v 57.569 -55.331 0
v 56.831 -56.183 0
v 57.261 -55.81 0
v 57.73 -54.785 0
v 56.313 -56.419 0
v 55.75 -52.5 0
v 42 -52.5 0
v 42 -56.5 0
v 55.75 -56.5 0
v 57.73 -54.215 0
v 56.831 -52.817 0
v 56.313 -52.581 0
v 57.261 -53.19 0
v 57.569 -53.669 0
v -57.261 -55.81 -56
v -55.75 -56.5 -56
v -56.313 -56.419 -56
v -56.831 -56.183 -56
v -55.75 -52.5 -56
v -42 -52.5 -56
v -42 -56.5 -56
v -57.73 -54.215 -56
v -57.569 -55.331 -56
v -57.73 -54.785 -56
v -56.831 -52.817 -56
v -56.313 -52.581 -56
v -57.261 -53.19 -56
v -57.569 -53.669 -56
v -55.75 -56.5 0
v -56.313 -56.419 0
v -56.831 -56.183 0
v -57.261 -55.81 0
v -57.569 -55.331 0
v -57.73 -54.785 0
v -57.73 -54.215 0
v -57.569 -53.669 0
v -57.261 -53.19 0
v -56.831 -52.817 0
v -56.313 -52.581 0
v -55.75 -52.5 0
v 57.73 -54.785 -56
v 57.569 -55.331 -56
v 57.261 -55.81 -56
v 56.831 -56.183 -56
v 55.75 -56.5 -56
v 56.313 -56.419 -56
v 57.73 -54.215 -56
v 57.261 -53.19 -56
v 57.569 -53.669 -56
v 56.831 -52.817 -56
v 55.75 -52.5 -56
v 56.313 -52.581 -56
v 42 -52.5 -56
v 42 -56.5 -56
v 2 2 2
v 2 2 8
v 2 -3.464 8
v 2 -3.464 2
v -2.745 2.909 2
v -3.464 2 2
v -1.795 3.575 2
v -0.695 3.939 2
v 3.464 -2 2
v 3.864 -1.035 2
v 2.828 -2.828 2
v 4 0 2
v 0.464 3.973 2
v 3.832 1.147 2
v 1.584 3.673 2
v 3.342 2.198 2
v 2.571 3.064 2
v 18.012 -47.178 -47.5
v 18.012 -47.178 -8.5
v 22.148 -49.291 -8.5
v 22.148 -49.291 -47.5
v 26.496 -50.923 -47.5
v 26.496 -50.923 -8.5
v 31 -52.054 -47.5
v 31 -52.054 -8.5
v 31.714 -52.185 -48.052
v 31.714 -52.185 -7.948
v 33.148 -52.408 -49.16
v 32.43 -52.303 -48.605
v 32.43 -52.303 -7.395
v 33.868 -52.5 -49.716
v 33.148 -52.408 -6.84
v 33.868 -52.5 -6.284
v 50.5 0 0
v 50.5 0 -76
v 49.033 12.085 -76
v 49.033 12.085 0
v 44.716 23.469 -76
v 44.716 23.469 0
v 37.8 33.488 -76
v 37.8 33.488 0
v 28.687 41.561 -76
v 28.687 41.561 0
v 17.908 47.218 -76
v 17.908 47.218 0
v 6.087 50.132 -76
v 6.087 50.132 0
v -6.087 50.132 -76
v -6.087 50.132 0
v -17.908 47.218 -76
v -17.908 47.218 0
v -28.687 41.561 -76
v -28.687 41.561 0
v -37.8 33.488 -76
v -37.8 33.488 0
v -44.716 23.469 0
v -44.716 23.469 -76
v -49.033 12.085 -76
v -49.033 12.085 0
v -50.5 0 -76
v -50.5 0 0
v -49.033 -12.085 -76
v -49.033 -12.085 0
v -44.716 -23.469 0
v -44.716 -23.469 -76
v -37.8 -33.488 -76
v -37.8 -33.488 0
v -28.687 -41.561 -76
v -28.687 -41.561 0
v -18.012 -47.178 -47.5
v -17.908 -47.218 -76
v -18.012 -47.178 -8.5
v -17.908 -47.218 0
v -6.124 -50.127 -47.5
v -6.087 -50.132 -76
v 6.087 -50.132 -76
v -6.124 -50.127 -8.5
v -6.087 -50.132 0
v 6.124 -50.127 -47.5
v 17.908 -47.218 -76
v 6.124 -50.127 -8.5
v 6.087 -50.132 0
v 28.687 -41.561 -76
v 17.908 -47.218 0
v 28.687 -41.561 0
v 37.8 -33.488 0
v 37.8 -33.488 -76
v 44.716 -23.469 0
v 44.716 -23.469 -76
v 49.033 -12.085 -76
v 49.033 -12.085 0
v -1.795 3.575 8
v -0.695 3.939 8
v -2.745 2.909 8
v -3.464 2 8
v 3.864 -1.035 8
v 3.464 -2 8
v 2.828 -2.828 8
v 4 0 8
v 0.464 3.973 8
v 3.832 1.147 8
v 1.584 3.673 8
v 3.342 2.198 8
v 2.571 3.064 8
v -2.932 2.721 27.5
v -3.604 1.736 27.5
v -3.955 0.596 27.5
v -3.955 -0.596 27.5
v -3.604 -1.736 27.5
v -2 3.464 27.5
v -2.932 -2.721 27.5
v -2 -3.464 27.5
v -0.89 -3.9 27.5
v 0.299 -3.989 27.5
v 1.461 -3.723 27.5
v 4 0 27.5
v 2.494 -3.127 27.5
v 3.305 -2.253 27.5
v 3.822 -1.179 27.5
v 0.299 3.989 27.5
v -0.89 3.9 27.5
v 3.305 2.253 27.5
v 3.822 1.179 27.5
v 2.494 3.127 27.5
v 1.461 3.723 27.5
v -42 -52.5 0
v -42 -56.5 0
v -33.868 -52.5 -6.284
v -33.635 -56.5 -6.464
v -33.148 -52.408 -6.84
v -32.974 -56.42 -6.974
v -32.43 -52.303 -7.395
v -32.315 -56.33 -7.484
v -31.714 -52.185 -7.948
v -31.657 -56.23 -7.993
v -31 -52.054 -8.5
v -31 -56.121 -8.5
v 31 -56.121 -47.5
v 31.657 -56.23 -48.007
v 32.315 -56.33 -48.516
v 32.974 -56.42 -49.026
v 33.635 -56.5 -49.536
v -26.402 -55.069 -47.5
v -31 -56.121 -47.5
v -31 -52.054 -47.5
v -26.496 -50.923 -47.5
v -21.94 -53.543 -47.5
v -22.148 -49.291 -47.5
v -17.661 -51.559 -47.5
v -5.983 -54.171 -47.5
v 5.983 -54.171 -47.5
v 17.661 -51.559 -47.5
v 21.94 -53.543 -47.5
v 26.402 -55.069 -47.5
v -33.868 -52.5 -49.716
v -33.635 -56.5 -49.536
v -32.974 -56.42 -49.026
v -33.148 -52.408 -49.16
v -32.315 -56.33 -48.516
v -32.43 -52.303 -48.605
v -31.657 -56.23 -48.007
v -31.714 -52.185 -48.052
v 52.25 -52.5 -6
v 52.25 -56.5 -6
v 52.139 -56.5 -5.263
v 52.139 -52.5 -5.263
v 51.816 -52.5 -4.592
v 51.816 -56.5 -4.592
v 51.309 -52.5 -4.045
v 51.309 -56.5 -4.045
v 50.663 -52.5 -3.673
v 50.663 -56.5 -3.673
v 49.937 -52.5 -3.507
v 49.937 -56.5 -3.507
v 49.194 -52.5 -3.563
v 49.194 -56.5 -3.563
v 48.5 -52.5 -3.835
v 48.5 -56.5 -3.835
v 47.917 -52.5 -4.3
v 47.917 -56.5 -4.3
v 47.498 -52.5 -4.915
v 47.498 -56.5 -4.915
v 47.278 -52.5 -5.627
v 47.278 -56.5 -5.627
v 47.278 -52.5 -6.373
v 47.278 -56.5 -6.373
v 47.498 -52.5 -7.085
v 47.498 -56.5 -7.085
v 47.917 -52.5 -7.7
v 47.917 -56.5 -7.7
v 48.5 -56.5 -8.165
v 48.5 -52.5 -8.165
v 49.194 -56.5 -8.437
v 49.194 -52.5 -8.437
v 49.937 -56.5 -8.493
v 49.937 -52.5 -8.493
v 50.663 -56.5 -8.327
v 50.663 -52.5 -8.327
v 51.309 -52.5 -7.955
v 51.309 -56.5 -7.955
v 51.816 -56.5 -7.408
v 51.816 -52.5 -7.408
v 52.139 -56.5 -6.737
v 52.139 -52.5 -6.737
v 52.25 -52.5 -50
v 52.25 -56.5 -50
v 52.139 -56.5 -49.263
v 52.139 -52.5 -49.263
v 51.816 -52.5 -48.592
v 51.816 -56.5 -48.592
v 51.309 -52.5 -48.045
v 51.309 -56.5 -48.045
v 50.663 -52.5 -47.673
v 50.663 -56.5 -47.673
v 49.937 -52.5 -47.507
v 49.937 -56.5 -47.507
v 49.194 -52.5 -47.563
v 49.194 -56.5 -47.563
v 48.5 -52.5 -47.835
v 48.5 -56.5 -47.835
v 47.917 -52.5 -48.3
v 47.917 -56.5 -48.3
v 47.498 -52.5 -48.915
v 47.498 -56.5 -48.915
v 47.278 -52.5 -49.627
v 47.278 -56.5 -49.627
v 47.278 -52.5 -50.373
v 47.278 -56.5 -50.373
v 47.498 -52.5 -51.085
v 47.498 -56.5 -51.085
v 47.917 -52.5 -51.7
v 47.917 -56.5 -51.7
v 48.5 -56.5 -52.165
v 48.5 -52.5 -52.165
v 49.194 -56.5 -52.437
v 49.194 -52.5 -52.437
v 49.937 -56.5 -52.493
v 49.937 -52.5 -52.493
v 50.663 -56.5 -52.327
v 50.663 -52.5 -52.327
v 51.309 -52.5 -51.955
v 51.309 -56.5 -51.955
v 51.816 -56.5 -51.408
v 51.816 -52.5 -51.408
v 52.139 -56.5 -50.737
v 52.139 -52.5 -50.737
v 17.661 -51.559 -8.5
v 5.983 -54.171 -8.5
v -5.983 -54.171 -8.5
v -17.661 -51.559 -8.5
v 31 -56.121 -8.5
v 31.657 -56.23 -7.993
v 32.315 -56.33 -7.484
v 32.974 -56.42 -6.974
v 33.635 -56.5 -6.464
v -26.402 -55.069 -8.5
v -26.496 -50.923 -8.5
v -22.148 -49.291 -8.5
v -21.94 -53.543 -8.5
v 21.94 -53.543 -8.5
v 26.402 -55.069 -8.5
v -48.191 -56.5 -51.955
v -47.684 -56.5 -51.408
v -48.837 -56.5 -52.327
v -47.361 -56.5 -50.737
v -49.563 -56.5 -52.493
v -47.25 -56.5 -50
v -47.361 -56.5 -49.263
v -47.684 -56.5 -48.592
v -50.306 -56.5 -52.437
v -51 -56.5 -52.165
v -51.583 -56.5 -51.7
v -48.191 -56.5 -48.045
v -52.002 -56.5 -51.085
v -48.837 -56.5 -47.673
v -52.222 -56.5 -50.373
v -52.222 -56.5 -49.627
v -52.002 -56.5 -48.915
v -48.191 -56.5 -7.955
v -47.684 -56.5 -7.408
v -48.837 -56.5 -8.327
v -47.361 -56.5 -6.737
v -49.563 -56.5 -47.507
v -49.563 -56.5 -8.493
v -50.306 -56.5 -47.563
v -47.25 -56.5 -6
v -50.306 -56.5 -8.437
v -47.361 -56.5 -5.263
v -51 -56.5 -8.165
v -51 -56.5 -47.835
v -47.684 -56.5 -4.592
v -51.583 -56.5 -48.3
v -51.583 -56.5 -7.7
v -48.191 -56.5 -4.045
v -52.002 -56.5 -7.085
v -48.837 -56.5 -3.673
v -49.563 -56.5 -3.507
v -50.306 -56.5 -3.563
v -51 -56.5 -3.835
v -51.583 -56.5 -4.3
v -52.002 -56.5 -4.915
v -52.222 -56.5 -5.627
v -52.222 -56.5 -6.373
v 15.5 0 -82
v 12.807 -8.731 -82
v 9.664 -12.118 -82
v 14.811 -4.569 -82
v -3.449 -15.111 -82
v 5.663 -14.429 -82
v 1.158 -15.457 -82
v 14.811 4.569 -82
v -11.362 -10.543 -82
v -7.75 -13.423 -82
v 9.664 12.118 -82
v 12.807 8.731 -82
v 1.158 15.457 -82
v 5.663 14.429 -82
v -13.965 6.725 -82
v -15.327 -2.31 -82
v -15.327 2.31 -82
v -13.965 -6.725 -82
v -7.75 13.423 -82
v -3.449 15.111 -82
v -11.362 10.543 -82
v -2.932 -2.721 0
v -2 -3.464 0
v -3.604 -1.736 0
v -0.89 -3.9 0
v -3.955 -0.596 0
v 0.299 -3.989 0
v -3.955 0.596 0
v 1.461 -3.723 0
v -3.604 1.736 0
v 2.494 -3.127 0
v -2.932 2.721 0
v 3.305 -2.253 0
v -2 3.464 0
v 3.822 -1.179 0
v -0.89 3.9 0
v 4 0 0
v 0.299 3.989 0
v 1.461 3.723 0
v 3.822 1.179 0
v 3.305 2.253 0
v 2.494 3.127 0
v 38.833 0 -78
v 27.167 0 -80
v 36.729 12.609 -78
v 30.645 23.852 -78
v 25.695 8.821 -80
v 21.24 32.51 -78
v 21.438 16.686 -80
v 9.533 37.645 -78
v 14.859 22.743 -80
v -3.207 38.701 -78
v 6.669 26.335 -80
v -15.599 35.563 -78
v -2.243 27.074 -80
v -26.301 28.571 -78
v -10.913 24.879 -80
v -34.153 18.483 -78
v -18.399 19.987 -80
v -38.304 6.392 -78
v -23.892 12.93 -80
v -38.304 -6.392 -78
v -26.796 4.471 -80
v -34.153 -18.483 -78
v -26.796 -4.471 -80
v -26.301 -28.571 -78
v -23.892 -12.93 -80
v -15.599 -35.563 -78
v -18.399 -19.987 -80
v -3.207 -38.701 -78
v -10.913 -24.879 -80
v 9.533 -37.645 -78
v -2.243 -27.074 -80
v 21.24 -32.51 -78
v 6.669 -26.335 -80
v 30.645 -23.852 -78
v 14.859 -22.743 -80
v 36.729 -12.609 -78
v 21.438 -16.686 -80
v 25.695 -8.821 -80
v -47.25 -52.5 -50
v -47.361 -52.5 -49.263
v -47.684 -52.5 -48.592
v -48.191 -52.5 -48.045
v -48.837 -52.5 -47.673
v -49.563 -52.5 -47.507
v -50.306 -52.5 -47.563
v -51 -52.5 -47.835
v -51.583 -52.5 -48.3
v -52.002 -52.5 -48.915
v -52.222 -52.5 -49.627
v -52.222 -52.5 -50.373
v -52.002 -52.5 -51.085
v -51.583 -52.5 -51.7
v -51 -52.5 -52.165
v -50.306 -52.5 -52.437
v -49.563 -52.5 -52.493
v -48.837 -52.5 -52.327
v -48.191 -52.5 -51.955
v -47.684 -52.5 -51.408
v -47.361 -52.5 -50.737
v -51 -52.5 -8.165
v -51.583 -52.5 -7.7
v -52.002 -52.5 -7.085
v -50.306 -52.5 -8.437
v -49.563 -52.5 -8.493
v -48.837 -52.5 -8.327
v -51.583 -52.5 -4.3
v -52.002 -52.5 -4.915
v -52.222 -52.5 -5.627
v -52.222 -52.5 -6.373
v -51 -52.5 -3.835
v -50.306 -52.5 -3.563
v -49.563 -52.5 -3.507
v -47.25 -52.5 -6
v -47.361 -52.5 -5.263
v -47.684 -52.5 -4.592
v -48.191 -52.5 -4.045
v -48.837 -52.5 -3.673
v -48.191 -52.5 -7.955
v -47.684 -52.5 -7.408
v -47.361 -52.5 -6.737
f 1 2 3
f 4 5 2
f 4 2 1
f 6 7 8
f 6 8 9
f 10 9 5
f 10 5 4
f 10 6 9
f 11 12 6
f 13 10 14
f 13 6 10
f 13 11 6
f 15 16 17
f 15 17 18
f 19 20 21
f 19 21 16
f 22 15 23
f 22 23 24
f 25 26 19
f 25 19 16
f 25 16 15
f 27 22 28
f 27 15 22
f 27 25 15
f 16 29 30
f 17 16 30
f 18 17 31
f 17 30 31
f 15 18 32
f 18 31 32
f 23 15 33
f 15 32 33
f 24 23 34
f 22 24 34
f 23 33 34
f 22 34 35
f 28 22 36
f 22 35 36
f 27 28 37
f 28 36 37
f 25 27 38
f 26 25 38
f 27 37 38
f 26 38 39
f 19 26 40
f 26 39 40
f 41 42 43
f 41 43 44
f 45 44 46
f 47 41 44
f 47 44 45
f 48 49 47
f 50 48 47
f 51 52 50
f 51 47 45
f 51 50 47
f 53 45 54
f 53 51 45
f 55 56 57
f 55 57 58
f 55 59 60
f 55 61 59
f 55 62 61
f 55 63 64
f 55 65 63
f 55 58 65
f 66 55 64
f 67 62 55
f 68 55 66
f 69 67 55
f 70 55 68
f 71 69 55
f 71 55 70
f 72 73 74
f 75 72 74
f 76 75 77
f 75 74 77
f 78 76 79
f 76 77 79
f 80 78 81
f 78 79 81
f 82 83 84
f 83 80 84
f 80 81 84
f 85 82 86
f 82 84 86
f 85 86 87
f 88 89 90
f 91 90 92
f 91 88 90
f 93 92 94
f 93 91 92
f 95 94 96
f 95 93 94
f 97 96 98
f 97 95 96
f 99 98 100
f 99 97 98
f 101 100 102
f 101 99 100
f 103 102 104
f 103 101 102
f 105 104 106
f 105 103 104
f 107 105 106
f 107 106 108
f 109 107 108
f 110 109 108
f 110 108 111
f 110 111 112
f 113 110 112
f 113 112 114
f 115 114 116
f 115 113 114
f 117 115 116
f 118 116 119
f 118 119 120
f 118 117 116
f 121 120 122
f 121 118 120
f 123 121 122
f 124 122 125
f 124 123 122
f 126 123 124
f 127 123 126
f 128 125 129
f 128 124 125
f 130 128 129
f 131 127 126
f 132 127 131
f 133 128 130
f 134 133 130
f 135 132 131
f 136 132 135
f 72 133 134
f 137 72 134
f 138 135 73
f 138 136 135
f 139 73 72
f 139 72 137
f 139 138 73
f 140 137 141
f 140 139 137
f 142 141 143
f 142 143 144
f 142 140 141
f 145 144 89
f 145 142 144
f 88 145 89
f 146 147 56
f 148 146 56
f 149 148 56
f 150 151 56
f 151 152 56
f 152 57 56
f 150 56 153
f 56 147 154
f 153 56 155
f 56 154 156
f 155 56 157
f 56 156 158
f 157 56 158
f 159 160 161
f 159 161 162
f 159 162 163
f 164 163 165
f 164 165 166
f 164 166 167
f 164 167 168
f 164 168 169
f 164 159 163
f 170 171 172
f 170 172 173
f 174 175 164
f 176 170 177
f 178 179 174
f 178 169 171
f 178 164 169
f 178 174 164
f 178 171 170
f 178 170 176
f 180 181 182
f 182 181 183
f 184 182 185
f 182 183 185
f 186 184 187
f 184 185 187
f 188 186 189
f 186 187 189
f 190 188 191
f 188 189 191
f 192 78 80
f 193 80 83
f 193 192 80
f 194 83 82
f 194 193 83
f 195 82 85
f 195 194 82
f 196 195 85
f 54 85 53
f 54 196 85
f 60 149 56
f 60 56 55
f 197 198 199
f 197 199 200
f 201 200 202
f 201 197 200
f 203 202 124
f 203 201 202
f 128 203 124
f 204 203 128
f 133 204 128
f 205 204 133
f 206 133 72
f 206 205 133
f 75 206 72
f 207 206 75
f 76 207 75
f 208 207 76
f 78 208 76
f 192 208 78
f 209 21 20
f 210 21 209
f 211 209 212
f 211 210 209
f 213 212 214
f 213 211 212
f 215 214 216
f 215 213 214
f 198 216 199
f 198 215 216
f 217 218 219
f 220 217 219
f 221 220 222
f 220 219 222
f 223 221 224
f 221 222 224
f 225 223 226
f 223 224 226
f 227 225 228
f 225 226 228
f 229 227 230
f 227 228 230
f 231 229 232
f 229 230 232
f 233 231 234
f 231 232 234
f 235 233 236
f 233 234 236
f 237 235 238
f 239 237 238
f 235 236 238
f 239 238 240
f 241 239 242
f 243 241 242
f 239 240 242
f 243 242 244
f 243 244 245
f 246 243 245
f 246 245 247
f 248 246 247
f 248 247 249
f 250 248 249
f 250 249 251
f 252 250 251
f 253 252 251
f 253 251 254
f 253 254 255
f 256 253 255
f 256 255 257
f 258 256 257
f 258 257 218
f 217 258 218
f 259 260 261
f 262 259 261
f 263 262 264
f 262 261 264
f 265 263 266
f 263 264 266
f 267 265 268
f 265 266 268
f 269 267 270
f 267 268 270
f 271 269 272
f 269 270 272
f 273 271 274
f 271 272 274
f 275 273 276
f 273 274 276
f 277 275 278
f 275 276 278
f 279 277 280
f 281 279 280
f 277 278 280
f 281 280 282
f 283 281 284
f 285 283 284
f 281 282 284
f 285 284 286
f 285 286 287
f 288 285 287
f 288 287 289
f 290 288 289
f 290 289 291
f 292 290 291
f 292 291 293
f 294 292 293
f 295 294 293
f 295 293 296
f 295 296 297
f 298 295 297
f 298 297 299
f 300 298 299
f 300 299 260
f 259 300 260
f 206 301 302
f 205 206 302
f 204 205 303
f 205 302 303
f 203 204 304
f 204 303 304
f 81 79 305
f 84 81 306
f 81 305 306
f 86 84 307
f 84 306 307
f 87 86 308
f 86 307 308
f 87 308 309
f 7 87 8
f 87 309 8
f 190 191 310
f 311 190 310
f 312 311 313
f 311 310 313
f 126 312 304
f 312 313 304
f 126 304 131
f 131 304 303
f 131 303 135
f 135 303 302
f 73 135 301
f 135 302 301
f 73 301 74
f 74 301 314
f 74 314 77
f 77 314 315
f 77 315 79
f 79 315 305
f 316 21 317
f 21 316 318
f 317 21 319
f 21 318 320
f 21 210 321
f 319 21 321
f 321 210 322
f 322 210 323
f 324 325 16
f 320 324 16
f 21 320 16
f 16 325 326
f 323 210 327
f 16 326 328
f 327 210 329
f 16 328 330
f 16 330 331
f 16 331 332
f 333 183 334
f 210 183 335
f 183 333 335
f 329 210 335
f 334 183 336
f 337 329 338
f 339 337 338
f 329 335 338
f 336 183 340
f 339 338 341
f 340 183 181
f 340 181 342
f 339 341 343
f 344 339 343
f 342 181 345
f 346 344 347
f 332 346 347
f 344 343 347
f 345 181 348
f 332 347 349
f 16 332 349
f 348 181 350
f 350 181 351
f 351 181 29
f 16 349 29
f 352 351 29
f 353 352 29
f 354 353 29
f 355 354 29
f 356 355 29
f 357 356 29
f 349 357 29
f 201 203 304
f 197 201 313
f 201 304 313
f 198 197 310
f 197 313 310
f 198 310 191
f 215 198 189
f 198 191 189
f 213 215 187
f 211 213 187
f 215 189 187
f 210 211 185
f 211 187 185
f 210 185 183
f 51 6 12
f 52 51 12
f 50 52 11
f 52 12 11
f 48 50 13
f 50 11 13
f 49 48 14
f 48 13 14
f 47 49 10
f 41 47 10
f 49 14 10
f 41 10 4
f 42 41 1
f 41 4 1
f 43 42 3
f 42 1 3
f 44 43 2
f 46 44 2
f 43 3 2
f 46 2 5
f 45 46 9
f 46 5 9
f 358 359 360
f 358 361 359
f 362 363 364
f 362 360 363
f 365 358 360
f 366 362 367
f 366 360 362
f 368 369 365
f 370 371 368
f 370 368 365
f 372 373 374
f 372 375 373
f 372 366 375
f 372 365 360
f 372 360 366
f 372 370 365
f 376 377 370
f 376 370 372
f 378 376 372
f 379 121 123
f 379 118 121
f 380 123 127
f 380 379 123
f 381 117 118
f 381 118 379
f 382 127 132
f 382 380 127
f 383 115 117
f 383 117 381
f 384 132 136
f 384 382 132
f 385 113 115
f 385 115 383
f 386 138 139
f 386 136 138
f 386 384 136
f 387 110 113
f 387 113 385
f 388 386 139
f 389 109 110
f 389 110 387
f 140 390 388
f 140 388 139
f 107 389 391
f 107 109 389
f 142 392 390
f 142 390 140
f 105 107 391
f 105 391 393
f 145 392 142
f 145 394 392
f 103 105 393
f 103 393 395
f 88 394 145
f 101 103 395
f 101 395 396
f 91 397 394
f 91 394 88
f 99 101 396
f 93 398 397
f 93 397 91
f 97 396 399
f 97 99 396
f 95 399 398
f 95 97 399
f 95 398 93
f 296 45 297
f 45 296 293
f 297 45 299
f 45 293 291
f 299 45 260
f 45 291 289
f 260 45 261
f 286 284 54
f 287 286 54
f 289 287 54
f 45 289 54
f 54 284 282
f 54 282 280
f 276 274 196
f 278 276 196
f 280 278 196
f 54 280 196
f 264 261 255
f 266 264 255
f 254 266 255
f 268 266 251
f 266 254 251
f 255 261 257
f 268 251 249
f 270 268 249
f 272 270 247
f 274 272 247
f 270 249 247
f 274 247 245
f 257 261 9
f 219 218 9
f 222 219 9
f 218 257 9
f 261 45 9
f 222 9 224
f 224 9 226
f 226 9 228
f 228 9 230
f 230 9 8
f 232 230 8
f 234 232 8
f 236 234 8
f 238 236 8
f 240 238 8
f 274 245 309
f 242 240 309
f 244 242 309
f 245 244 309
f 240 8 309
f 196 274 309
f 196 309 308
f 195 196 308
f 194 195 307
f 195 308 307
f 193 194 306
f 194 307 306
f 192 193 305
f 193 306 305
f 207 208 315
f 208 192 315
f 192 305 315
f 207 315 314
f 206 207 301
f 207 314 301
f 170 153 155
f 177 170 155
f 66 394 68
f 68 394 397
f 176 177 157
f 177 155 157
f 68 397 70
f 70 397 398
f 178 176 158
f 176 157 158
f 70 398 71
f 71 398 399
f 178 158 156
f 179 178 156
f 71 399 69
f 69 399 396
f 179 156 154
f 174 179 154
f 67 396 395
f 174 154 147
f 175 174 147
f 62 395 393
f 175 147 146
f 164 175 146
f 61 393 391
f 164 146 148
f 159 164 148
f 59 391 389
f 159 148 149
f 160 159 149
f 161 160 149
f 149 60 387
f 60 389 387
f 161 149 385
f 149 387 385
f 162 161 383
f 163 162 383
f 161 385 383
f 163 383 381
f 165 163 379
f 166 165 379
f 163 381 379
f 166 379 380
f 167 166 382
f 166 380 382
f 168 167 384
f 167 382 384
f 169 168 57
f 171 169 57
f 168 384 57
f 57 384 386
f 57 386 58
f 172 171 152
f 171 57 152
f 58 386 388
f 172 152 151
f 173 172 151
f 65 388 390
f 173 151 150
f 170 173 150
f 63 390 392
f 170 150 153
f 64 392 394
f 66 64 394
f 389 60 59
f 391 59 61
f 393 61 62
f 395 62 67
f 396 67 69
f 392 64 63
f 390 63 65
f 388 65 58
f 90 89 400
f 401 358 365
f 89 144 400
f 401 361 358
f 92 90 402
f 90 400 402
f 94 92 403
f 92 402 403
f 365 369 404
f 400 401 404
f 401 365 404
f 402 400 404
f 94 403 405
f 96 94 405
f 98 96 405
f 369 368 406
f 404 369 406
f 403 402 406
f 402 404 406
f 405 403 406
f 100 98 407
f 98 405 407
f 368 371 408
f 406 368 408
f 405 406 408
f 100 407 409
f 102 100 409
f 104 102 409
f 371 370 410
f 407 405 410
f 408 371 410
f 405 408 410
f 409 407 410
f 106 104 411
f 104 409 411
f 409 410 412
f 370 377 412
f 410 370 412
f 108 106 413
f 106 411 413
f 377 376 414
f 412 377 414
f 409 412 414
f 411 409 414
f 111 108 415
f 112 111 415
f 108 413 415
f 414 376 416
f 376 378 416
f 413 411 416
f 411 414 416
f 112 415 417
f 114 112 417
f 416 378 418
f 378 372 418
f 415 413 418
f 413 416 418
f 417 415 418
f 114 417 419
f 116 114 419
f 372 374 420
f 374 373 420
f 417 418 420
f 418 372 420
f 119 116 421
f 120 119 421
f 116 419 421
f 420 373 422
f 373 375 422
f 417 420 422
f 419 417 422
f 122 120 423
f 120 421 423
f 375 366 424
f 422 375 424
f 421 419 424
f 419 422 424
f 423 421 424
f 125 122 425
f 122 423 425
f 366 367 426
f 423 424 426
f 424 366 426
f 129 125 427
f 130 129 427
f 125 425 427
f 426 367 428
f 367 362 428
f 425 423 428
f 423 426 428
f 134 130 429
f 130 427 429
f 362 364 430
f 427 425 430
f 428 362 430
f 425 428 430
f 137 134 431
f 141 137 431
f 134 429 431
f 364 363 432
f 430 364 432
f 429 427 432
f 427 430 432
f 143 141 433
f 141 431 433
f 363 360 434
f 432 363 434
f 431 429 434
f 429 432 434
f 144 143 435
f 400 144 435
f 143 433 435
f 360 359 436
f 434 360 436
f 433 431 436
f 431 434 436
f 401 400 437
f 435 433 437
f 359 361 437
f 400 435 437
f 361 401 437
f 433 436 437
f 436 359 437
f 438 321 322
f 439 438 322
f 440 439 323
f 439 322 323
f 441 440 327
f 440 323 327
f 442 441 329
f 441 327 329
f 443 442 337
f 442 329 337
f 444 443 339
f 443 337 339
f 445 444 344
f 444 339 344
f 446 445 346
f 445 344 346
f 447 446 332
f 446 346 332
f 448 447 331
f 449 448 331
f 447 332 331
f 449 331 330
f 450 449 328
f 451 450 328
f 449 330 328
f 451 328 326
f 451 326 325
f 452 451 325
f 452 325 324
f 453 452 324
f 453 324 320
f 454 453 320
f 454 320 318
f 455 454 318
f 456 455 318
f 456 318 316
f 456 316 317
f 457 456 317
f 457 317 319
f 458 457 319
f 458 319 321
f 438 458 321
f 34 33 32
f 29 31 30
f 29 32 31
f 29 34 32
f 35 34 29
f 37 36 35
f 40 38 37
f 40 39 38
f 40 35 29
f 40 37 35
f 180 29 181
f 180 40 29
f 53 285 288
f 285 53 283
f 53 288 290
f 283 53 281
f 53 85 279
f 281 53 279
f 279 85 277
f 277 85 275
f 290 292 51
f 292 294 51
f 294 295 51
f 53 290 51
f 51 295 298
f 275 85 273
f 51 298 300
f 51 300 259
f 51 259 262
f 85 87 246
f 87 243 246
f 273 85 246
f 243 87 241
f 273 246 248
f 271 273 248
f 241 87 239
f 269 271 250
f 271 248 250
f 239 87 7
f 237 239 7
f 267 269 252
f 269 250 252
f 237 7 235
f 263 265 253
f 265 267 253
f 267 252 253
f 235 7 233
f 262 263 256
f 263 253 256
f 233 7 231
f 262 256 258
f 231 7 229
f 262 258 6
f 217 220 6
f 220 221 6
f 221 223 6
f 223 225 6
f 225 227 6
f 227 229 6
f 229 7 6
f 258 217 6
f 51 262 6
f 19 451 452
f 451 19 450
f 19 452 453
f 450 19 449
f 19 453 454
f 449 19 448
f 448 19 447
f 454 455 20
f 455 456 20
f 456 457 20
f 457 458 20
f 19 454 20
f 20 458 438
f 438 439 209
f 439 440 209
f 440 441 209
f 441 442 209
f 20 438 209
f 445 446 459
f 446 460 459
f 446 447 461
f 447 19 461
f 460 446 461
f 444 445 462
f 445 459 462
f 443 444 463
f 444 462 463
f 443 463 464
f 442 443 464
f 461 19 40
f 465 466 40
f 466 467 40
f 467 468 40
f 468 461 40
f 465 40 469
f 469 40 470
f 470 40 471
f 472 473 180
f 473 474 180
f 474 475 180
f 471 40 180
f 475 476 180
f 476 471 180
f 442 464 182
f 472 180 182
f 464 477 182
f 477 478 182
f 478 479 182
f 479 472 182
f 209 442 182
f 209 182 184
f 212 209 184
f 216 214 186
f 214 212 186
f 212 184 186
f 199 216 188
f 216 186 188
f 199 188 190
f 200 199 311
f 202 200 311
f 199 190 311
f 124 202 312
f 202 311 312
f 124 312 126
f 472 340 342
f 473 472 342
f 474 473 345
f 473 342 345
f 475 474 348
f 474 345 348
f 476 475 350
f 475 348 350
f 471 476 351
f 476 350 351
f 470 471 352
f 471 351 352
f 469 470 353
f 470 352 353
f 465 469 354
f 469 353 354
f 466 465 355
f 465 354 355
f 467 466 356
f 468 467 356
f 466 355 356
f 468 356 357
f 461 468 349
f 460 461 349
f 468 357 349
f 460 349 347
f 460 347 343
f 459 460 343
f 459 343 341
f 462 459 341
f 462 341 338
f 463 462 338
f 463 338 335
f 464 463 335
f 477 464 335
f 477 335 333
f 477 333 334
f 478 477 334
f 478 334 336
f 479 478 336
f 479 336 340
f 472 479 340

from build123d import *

# Parameters (mm, degrees)
SKETCH1_R           = 50.5
BOSS_EXTRUDE1_DEPTH = 76
SKETCH2_R           = 4
BOSS_EXTRUDE2_DEPTH = 27.5
SKETCH3_R           = 15.5
BOSS_EXTRUDE3_DEPTH = 56
CUT_EXTRUDE1_DEPTH  = 14
SKETCH6_R           = 50.5
BOSS_EXTRUDE4_DEPTH = 69
CUT_EXTRUDE2_REACH  = 109
SKETCH7_R           = 2.5
CUT_EXTRUDE3_START  = -229.584638372
SKETCH8_W           = 6
SKETCH8_H           = 2
CUT_EXTRUDE3_DEPTH  = 230.584638372
CIRPATTERN1_COUNT   = 2
CIRPATTERN1_ANGLE   = 90


with BuildPart() as part:
    # Sketch1 → Boss-Extrude1 (new body)
    with BuildSketch(Plane.XY):
        Circle(SKETCH1_R)
    extrude(amount=-BOSS_EXTRUDE1_DEPTH)

    # Sketch2 → Boss-Extrude2 (add)
    with BuildSketch(Plane.XY):
        Circle(SKETCH2_R)
    extrude(amount=BOSS_EXTRUDE2_DEPTH)

    # Sketch3 → section 1 of loft1
    with BuildSketch(Plane(origin=(0, 0, -82), x_dir=(-1, 0, 0), z_dir=(0, 0, -1)), mode=Mode.PRIVATE) as loft1_s1:
        Circle(SKETCH3_R)
    # loft from a face of the part (loft1)
    loft([part.faces().sort_by_distance((0, 0, -76))[0], loft1_s1.sketch])

    # Sketch4 → Boss-Extrude3 (add)
    with BuildSketch(Plane.XY):
        with BuildLine():
            Line((-55.75, -52.5), (-33.867548492, -52.5))
            ThreePointArc((-33.867548492, -52.5), (-25.666216724, -50.654640627), (-18.012227442, -47.178487286))
            ThreePointArc((-18.012227442, -47.178487286), (0, -50.5), (18.012227442, -47.178487286))
            ThreePointArc((18.012227442, -47.178487286), (25.666216724, -50.654640627), (33.867548492, -52.5))
            Line((33.867548492, -52.5), (55.75, -52.5))
            ThreePointArc((55.75, -52.5), (57.75, -54.5), (55.75, -56.5))
            Line((55.75, -56.5), (33.635158839, -56.5))
            ThreePointArc((33.635158839, -56.5), (25.41686368, -54.776707383), (17.660730448, -51.559175711))
            ThreePointArc((17.660730448, -51.559175711), (0, -54.5), (-17.660730448, -51.559175711))
            ThreePointArc((-17.660730448, -51.559175711), (-25.41686368, -54.776707383), (-33.635158839, -56.5))
            Line((-33.635158839, -56.5), (-55.75, -56.5))
            ThreePointArc((-55.75, -56.5), (-57.75, -54.5), (-55.75, -52.5))
        make_face()
    extrude(amount=-BOSS_EXTRUDE3_DEPTH)

    # Sketch5 → Cut-Extrude1 (cut)
    with BuildSketch(Plane.XZ.offset(56.5)):
        Polygon((-31, -8.5), (31, -8.5), (42, 0), (-42, 0), align=None)
        Polygon((-42, -56), (-31, -47.5), (31, -47.5), (42, -56), align=None)
    extrude(amount=-CUT_EXTRUDE1_DEPTH, mode=Mode.SUBTRACT)

    # Sketch6 → Boss-Extrude4 (add)
    with BuildSketch(Plane.XY):
        Circle(SKETCH6_R)
    extrude(amount=-BOSS_EXTRUDE4_DEPTH)

    # Sketch7 → Cut-Extrude2 (cut, up to next)
    with BuildSketch(Plane.XZ.offset(56.5), mode=Mode.PRIVATE) as cut_extrude2_sk1:
        with Locations((-49.75, -6)):
            Circle(SKETCH7_R)
    cut_extrude2_tool1 = extrude(cut_extrude2_sk1.sketch, amount=-CUT_EXTRUDE2_REACH, mode=Mode.PRIVATE) & part.part
    add(cut_extrude2_tool1.solids().sort_by_distance((-49.75, -56.5, -6))[0], mode=Mode.SUBTRACT)
    # Sketch7 → Cut-Extrude2 (cut, up to next)
    with BuildSketch(Plane.XZ.offset(56.5), mode=Mode.PRIVATE) as cut_extrude2_sk2:
        with Locations((-49.75, -50)):
            Circle(SKETCH7_R)
    cut_extrude2_tool2 = extrude(cut_extrude2_sk2.sketch, amount=-CUT_EXTRUDE2_REACH, mode=Mode.PRIVATE) & part.part
    add(cut_extrude2_tool2.solids().sort_by_distance((-49.75, -56.5, -50))[0], mode=Mode.SUBTRACT)
    # Sketch7 → Cut-Extrude2 (cut, up to next)
    with BuildSketch(Plane.XZ.offset(56.5), mode=Mode.PRIVATE) as cut_extrude2_sk3:
        with Locations((49.75, -50)):
            Circle(SKETCH7_R)
    cut_extrude2_tool3 = extrude(cut_extrude2_sk3.sketch, amount=-CUT_EXTRUDE2_REACH, mode=Mode.PRIVATE) & part.part
    add(cut_extrude2_tool3.solids().sort_by_distance((49.75, -56.5, -50))[0], mode=Mode.SUBTRACT)
    # Sketch7 → Cut-Extrude2 (cut, up to next)
    with BuildSketch(Plane.XZ.offset(56.5), mode=Mode.PRIVATE) as cut_extrude2_sk4:
        with Locations((49.75, -6)):
            Circle(SKETCH7_R)
    cut_extrude2_tool4 = extrude(cut_extrude2_sk4.sketch, amount=-CUT_EXTRUDE2_REACH, mode=Mode.PRIVATE) & part.part
    add(cut_extrude2_tool4.solids().sort_by_distance((49.75, -56.5, -6))[0], mode=Mode.SUBTRACT)

    # Sketch8 → Cut-Extrude3 (cut)
    with BuildSketch(Plane(origin=(170.834638372, -107.162802213, -173.5), x_dir=(0, 0, -1), z_dir=(1, 0, 0)).offset(CUT_EXTRUDE3_START)):
        with Locations((-178.5, 110.162802213)):
            Rectangle(SKETCH8_W, SKETCH8_H)
    cut_extrude3 = extrude(amount=CUT_EXTRUDE3_DEPTH, mode=Mode.SUBTRACT)

    # CirPattern1: Cut-Extrude3 ×2 about axis
    cirpattern1_axis = Axis((0, 0, 27.5), (0, 0, -1))
    for i in range(1, CIRPATTERN1_COUNT):
        add(cut_extrude3.rotate(cirpattern1_axis, i * CIRPATTERN1_ANGLE / (CIRPATTERN1_COUNT - 1)), mode=Mode.SUBTRACT)


solid = part.part
